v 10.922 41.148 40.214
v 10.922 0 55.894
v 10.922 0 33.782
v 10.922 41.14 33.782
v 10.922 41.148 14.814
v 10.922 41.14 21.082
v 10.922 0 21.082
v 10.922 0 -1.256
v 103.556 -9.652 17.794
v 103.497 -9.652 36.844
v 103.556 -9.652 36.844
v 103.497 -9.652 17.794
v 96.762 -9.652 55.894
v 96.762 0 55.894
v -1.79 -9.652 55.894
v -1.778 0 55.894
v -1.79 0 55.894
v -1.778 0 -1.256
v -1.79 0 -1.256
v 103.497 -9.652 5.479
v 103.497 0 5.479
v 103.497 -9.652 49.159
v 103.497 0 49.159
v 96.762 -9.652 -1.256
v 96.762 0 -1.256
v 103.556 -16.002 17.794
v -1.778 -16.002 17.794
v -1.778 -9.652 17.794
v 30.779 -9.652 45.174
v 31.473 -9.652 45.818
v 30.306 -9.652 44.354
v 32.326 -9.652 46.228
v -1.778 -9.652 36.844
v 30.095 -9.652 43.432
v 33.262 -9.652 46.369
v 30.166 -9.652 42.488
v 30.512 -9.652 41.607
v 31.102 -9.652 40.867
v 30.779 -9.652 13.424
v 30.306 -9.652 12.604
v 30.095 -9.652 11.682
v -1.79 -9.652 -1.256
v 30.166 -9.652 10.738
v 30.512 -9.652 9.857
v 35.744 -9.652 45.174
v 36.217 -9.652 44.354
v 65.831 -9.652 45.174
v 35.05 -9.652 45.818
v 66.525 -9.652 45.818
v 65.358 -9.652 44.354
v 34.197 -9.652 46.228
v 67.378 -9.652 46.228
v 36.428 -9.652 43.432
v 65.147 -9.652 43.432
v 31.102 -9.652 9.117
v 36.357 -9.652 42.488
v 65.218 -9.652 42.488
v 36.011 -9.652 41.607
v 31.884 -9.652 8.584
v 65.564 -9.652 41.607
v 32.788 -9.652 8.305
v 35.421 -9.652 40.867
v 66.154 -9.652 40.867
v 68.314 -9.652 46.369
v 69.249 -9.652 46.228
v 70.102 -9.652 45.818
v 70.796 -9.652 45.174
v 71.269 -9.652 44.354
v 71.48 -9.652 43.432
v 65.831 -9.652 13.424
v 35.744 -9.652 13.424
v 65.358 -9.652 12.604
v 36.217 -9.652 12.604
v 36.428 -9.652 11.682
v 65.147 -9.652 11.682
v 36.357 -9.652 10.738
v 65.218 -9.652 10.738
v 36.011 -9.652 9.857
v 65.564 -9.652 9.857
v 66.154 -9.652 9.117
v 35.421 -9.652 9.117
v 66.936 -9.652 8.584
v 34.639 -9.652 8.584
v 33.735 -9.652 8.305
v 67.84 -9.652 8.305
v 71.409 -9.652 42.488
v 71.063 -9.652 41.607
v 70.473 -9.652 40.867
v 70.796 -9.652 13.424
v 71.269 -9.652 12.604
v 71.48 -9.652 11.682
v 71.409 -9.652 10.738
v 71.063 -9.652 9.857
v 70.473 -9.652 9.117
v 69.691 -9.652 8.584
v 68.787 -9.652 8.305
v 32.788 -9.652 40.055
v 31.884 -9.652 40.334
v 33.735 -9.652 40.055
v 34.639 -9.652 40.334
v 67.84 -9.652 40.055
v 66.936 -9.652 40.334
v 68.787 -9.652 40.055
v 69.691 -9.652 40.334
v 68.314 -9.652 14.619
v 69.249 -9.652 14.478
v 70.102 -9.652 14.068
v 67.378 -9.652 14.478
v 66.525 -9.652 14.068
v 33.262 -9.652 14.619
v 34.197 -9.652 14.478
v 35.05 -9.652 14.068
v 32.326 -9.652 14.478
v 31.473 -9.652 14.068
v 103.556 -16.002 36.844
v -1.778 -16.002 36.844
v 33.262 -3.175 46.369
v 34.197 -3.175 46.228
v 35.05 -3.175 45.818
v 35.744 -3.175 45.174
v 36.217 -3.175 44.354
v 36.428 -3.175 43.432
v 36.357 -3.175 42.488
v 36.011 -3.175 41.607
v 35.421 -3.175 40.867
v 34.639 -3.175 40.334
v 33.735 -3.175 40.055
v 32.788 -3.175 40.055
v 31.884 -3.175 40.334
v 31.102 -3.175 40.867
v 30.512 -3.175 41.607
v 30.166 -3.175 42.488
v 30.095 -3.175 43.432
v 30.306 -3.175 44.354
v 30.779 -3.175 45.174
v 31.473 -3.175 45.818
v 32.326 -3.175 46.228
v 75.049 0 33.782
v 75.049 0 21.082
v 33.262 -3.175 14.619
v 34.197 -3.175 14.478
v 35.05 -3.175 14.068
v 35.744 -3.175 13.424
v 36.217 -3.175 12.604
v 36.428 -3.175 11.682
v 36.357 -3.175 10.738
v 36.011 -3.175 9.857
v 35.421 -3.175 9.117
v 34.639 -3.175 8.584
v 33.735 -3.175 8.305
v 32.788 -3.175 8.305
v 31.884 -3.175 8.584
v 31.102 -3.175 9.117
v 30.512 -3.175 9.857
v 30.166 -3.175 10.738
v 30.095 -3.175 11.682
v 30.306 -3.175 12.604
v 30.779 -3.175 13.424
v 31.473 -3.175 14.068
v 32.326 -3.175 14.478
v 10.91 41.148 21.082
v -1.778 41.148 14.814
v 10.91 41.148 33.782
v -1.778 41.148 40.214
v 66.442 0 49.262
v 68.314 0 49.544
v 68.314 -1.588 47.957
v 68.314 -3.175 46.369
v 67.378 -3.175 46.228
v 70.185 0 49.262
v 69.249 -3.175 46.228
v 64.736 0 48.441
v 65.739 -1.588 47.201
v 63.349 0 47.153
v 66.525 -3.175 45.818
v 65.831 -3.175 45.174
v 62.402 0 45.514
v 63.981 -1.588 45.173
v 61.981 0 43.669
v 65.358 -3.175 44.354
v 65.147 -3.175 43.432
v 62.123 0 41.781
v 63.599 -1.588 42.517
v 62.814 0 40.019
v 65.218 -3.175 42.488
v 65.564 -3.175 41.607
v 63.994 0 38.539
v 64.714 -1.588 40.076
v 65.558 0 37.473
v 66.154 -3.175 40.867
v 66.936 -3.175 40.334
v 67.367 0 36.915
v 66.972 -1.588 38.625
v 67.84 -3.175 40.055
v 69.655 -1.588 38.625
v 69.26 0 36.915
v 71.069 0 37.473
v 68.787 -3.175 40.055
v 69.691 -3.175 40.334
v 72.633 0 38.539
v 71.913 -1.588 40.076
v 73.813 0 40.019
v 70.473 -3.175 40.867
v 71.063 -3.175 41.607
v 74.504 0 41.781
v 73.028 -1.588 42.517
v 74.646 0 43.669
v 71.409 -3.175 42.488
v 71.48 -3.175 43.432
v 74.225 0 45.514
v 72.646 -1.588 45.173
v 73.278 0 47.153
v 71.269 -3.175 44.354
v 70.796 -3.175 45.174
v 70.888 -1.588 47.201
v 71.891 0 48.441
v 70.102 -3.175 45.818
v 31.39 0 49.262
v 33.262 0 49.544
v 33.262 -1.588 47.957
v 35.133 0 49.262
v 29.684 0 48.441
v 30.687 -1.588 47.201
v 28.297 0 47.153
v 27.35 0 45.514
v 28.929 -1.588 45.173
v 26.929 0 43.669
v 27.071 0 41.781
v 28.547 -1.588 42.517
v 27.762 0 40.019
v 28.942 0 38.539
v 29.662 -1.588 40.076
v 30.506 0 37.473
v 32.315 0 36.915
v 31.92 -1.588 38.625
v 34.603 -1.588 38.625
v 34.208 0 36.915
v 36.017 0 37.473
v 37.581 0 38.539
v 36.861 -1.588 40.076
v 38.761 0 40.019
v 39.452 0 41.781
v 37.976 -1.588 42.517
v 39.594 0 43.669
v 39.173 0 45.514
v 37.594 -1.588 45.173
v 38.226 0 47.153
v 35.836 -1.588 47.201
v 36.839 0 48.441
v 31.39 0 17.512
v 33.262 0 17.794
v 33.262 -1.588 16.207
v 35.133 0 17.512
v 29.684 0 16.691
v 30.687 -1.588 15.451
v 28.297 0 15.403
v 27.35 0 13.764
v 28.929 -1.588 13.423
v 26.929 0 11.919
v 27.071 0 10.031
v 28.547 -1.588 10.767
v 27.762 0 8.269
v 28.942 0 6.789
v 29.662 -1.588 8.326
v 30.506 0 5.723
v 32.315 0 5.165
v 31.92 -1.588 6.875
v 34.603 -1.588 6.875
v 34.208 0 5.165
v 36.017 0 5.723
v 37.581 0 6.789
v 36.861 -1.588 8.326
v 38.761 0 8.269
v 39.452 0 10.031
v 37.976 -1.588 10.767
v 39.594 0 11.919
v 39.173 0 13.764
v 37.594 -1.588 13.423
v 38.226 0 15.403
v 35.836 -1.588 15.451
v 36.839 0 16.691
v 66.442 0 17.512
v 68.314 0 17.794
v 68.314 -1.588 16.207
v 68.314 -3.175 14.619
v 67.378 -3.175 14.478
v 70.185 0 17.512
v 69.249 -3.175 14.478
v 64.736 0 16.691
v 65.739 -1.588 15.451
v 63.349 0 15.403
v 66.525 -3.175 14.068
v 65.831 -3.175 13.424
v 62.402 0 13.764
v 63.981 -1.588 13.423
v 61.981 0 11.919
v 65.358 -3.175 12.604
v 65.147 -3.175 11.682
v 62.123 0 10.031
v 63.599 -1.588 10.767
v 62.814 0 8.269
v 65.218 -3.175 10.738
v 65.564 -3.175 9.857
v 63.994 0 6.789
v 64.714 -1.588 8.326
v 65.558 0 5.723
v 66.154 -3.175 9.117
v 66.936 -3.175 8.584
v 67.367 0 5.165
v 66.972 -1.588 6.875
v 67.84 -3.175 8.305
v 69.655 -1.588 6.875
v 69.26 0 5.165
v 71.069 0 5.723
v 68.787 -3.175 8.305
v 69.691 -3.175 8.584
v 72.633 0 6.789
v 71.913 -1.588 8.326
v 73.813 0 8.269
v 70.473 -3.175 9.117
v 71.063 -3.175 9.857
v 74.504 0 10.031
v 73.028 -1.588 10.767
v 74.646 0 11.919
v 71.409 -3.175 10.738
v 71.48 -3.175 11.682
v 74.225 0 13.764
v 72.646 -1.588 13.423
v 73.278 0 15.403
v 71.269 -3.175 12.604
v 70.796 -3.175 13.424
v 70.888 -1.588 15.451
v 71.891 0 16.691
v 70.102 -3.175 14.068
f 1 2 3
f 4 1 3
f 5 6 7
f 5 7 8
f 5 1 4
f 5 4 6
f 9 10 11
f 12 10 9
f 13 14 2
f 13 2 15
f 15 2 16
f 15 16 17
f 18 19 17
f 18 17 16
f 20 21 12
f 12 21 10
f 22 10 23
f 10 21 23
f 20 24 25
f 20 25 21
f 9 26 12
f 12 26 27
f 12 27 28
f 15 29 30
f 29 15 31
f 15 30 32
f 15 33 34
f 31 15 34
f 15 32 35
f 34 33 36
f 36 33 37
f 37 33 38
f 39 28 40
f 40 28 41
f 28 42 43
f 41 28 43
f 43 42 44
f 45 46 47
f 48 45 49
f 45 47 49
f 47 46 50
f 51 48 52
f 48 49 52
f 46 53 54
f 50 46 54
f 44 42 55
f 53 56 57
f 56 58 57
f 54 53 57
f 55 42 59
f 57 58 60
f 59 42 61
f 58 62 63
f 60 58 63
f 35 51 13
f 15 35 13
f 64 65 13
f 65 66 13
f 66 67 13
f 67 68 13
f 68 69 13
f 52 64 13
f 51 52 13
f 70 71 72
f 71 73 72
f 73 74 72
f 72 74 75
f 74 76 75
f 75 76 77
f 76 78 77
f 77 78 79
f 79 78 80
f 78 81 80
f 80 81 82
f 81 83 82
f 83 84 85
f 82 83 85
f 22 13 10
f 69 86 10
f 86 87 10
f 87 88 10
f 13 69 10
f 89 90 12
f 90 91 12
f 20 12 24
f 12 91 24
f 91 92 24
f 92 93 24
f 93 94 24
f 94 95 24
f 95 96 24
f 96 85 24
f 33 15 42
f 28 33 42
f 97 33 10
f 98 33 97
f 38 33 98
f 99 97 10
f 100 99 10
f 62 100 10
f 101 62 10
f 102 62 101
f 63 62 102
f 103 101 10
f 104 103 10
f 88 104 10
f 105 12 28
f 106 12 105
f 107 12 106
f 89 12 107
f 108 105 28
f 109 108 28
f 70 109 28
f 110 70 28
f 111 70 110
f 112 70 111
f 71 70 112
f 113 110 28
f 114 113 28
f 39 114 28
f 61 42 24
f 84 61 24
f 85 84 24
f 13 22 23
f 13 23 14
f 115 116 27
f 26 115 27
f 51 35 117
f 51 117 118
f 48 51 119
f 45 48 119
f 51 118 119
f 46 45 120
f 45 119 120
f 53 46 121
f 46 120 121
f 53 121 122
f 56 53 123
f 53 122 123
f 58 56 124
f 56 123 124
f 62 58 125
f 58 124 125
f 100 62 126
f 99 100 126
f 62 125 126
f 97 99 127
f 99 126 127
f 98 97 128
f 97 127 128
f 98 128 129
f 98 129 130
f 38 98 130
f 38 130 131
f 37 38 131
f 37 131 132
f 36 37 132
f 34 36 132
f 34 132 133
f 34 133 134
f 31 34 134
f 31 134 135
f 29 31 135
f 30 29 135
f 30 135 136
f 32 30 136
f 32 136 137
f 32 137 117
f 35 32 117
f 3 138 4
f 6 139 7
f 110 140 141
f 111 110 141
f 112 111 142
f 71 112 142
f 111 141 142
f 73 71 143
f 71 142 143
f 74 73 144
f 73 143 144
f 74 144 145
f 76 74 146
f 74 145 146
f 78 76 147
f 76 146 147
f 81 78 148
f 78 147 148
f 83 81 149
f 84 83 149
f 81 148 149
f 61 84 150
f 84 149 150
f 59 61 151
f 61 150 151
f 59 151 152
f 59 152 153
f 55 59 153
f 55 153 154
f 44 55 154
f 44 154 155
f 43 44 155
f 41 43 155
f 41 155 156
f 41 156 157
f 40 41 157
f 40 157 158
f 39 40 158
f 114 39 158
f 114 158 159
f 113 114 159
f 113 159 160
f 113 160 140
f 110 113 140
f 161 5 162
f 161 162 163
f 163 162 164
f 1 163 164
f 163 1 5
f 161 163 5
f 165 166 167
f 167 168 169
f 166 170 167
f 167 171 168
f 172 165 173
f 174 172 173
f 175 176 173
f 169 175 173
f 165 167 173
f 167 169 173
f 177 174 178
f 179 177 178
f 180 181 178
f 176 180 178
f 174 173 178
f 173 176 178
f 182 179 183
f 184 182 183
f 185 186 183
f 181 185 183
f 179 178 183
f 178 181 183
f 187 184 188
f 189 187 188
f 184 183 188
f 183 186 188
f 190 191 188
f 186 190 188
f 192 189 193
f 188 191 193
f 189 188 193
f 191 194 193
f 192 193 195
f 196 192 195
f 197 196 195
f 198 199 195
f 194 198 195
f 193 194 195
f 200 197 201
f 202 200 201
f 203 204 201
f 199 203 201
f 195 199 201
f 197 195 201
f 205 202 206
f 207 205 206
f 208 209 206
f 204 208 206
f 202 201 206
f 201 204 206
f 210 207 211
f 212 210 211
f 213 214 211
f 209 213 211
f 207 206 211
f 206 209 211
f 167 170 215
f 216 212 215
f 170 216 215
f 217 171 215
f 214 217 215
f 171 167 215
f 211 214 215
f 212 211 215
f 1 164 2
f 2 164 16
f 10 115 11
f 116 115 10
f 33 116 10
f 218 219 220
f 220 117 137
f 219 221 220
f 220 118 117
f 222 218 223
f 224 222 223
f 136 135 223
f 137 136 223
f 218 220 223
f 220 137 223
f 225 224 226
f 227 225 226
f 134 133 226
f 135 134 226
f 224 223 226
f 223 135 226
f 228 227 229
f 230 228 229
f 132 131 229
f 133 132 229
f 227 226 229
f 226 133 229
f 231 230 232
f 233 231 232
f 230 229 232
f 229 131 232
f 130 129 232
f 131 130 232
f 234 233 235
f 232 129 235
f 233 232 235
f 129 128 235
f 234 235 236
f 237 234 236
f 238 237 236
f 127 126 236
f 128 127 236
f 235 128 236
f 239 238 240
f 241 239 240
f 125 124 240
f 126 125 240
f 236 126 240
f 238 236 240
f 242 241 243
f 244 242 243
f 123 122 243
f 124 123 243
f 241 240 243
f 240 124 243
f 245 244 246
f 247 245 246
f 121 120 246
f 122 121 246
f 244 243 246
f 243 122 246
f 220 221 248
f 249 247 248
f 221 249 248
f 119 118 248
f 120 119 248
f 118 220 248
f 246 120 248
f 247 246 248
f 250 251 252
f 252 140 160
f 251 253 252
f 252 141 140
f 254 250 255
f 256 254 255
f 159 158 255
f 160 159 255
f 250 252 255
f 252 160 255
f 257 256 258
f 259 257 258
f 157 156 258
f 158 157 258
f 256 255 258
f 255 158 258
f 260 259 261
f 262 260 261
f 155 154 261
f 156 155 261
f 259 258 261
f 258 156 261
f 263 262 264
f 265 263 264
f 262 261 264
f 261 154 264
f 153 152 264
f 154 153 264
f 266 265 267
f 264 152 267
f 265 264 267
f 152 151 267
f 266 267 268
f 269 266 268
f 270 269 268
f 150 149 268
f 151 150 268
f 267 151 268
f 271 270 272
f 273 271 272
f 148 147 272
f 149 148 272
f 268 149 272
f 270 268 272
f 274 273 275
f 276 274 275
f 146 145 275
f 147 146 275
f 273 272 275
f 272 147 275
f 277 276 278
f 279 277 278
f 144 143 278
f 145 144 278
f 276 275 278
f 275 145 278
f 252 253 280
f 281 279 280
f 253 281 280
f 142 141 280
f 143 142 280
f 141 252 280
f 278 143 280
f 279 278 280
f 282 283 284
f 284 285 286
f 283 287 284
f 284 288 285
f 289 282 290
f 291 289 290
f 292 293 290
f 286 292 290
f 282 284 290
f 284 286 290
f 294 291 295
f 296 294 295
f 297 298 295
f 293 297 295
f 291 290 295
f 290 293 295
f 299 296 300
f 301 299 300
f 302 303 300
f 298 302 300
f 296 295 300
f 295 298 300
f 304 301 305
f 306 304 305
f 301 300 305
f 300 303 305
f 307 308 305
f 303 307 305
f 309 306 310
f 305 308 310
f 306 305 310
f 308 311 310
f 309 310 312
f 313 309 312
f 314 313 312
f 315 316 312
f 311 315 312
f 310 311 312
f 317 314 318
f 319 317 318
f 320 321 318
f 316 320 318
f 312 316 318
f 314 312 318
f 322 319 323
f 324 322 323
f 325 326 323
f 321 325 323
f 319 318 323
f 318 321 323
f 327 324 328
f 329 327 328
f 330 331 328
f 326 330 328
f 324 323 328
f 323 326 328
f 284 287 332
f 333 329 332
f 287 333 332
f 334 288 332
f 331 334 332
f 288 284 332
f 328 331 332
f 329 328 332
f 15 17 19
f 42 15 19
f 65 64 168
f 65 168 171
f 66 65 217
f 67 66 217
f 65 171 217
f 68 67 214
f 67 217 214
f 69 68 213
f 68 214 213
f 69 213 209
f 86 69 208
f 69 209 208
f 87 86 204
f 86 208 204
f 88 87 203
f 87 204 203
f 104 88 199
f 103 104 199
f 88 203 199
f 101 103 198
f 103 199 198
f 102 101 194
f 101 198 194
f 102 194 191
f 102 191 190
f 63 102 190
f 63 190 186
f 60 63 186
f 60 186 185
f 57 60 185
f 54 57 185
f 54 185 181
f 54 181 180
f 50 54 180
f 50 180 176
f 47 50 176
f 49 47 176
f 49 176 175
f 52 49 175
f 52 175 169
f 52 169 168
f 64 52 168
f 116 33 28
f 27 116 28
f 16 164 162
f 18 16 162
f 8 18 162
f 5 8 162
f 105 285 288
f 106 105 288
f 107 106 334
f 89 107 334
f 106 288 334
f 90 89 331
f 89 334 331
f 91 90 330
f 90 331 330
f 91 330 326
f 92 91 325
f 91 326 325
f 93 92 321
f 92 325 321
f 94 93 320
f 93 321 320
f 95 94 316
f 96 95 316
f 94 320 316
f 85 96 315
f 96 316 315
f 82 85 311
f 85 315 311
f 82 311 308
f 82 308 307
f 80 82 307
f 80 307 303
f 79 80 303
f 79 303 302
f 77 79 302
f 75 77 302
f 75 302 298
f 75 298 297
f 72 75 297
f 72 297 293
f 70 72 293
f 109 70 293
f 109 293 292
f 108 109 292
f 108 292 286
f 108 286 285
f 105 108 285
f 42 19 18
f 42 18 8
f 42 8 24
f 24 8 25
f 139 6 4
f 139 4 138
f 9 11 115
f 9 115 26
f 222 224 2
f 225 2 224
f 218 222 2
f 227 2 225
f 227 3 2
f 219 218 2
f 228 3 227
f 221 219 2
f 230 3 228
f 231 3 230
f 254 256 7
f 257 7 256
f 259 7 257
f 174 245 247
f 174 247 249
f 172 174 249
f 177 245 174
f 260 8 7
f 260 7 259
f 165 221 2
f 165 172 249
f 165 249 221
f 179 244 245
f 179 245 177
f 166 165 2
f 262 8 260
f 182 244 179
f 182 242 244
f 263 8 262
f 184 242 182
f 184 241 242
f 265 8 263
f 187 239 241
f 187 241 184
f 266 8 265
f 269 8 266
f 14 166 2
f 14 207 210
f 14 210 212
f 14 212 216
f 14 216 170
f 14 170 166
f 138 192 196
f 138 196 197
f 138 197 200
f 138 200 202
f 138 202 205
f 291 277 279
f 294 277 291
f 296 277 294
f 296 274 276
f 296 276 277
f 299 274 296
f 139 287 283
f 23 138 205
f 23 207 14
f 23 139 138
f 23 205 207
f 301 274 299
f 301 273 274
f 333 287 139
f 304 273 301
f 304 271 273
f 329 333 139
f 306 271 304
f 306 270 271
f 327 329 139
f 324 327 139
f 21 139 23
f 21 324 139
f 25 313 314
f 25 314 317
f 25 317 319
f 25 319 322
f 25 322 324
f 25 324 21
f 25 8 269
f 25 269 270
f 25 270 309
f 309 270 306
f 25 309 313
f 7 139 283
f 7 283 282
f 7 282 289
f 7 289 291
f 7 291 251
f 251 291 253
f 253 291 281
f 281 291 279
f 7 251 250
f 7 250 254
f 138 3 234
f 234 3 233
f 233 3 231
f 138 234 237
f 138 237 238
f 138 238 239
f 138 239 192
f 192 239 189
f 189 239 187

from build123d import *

# Parameters (mm, degrees)
SKETCH1_R           = 3.175
BOSS_EXTRUDE4_DEPTH = 9.652
BOSS_EXTRUDE5_START = -1.778
SKETCH2_W           = 19.05
SKETCH2_H           = 6.35
BOSS_EXTRUDE5_DEPTH = 105.33369205
BOSS_EXTRUDE6_START = 21.082
BOSS_EXTRUDE6_DEPTH = 12.7
BOSS_EXTRUDE7_START = -1.778
BOSS_EXTRUDE7_DEPTH = 12.7


with BuildPart() as part:
    # Sketch1 → Boss-Extrude4 (new body)
    with BuildSketch(Plane(origin=(0, 0, 0), x_dir=(1, 0, 0), z_dir=(0, 1, 0))):
        Polygon((96.761507042, 1.255721831), (-1.790492958, 1.255721831), (-1.790492958, -55.894278169), (96.761507042, -55.894278169), (103.496699133, -49.159086078), (103.496699133, -5.47947026), align=None)
        with Locations((33.261507042, -43.194278169)):
            Circle(SKETCH1_R, mode=Mode.SUBTRACT)
        with Locations((68.313507042, -43.194278169)):
            Circle(SKETCH1_R, mode=Mode.SUBTRACT)
        with Locations((33.261507042, -11.444278169)):
            Circle(SKETCH1_R, mode=Mode.SUBTRACT)
        with Locations((68.313507042, -11.444278169)):
            Circle(SKETCH1_R, mode=Mode.SUBTRACT)
    extrude(amount=-BOSS_EXTRUDE4_DEPTH)

    # Cut-Extrude4 cone 1 section (through the dimple's axis) → Cut-Extrude4 (revolve, cut)
    with BuildSketch(Plane(origin=(33.261507042, 0, 11.444278169), x_dir=(0, 0, 1), z_dir=(1, 0, 0))):
        Polygon((0, 0), (6.35, 0), (0, 6.35), align=None)
    revolve(axis=Axis((33.261507042, 0, 11.444278169), (0, -1, 0)), mode=Mode.SUBTRACT)

    # Cut-Extrude4 cone 2 section (through the dimple's axis) → Cut-Extrude4 cone 2 (revolve, cut)
    with BuildSketch(Plane(origin=(68.313507042, 0, 11.444278169), x_dir=(0, 0, 1), z_dir=(1, 0, 0))):
        Polygon((0, 0), (6.35, 0), (0, 6.35), align=None)
    revolve(axis=Axis((68.313507042, 0, 11.444278169), (0, -1, 0)), mode=Mode.SUBTRACT)

    # Cut-Extrude4 cone 3 section (through the dimple's axis) → Cut-Extrude4 cone 3 (revolve, cut)
    with BuildSketch(Plane(origin=(33.261507042, 0, 43.194278169), x_dir=(0, 0, 1), z_dir=(1, 0, 0))):
        Polygon((0, 0), (6.35, 0), (0, 6.35), align=None)
    revolve(axis=Axis((33.261507042, 0, 43.194278169), (0, -1, 0)), mode=Mode.SUBTRACT)

    # Cut-Extrude4 cone 4 section (through the dimple's axis) → Cut-Extrude4 cone 4 (revolve, cut)
    with BuildSketch(Plane(origin=(68.313507042, 0, 43.194278169), x_dir=(0, 0, 1), z_dir=(1, 0, 0))):
        Polygon((0, 0), (6.35, 0), (0, 6.35), align=None)
    revolve(axis=Axis((68.313507042, 0, 43.194278169), (0, -1, 0)), mode=Mode.SUBTRACT)

    # Sketch2 → Boss-Extrude5 (add)
    with BuildSketch(Plane(origin=(0, 0, 0), x_dir=(0, 0, -1), z_dir=(1, 0, 0)).offset(BOSS_EXTRUDE5_START)):
        with Locations((-27.319278169, -12.827)):
            Rectangle(SKETCH2_W, SKETCH2_H)
    extrude(amount=BOSS_EXTRUDE5_DEPTH)

    # Sketch4 → Boss-Extrude6 (add)
    with BuildSketch(Plane.XY.offset(BOSS_EXTRUDE6_START)):
        Polygon((10.909507042, 0), (10.909507042, 41.148), (75.048699133, 0), align=None)
    extrude(amount=BOSS_EXTRUDE6_DEPTH)

    # Sketch5 → Boss-Extrude7 (add)
    with BuildSketch(Plane(origin=(0, 0, 0), x_dir=(0, 0, -1), z_dir=(1, 0, 0)).offset(BOSS_EXTRUDE7_START)):
        Polygon((-14.81428613, 41.148), (-40.21428613, 41.148), (-55.894278169, 0), (1.255721831, 0), align=None)
    extrude(amount=BOSS_EXTRUDE7_DEPTH)


solid = part.part
